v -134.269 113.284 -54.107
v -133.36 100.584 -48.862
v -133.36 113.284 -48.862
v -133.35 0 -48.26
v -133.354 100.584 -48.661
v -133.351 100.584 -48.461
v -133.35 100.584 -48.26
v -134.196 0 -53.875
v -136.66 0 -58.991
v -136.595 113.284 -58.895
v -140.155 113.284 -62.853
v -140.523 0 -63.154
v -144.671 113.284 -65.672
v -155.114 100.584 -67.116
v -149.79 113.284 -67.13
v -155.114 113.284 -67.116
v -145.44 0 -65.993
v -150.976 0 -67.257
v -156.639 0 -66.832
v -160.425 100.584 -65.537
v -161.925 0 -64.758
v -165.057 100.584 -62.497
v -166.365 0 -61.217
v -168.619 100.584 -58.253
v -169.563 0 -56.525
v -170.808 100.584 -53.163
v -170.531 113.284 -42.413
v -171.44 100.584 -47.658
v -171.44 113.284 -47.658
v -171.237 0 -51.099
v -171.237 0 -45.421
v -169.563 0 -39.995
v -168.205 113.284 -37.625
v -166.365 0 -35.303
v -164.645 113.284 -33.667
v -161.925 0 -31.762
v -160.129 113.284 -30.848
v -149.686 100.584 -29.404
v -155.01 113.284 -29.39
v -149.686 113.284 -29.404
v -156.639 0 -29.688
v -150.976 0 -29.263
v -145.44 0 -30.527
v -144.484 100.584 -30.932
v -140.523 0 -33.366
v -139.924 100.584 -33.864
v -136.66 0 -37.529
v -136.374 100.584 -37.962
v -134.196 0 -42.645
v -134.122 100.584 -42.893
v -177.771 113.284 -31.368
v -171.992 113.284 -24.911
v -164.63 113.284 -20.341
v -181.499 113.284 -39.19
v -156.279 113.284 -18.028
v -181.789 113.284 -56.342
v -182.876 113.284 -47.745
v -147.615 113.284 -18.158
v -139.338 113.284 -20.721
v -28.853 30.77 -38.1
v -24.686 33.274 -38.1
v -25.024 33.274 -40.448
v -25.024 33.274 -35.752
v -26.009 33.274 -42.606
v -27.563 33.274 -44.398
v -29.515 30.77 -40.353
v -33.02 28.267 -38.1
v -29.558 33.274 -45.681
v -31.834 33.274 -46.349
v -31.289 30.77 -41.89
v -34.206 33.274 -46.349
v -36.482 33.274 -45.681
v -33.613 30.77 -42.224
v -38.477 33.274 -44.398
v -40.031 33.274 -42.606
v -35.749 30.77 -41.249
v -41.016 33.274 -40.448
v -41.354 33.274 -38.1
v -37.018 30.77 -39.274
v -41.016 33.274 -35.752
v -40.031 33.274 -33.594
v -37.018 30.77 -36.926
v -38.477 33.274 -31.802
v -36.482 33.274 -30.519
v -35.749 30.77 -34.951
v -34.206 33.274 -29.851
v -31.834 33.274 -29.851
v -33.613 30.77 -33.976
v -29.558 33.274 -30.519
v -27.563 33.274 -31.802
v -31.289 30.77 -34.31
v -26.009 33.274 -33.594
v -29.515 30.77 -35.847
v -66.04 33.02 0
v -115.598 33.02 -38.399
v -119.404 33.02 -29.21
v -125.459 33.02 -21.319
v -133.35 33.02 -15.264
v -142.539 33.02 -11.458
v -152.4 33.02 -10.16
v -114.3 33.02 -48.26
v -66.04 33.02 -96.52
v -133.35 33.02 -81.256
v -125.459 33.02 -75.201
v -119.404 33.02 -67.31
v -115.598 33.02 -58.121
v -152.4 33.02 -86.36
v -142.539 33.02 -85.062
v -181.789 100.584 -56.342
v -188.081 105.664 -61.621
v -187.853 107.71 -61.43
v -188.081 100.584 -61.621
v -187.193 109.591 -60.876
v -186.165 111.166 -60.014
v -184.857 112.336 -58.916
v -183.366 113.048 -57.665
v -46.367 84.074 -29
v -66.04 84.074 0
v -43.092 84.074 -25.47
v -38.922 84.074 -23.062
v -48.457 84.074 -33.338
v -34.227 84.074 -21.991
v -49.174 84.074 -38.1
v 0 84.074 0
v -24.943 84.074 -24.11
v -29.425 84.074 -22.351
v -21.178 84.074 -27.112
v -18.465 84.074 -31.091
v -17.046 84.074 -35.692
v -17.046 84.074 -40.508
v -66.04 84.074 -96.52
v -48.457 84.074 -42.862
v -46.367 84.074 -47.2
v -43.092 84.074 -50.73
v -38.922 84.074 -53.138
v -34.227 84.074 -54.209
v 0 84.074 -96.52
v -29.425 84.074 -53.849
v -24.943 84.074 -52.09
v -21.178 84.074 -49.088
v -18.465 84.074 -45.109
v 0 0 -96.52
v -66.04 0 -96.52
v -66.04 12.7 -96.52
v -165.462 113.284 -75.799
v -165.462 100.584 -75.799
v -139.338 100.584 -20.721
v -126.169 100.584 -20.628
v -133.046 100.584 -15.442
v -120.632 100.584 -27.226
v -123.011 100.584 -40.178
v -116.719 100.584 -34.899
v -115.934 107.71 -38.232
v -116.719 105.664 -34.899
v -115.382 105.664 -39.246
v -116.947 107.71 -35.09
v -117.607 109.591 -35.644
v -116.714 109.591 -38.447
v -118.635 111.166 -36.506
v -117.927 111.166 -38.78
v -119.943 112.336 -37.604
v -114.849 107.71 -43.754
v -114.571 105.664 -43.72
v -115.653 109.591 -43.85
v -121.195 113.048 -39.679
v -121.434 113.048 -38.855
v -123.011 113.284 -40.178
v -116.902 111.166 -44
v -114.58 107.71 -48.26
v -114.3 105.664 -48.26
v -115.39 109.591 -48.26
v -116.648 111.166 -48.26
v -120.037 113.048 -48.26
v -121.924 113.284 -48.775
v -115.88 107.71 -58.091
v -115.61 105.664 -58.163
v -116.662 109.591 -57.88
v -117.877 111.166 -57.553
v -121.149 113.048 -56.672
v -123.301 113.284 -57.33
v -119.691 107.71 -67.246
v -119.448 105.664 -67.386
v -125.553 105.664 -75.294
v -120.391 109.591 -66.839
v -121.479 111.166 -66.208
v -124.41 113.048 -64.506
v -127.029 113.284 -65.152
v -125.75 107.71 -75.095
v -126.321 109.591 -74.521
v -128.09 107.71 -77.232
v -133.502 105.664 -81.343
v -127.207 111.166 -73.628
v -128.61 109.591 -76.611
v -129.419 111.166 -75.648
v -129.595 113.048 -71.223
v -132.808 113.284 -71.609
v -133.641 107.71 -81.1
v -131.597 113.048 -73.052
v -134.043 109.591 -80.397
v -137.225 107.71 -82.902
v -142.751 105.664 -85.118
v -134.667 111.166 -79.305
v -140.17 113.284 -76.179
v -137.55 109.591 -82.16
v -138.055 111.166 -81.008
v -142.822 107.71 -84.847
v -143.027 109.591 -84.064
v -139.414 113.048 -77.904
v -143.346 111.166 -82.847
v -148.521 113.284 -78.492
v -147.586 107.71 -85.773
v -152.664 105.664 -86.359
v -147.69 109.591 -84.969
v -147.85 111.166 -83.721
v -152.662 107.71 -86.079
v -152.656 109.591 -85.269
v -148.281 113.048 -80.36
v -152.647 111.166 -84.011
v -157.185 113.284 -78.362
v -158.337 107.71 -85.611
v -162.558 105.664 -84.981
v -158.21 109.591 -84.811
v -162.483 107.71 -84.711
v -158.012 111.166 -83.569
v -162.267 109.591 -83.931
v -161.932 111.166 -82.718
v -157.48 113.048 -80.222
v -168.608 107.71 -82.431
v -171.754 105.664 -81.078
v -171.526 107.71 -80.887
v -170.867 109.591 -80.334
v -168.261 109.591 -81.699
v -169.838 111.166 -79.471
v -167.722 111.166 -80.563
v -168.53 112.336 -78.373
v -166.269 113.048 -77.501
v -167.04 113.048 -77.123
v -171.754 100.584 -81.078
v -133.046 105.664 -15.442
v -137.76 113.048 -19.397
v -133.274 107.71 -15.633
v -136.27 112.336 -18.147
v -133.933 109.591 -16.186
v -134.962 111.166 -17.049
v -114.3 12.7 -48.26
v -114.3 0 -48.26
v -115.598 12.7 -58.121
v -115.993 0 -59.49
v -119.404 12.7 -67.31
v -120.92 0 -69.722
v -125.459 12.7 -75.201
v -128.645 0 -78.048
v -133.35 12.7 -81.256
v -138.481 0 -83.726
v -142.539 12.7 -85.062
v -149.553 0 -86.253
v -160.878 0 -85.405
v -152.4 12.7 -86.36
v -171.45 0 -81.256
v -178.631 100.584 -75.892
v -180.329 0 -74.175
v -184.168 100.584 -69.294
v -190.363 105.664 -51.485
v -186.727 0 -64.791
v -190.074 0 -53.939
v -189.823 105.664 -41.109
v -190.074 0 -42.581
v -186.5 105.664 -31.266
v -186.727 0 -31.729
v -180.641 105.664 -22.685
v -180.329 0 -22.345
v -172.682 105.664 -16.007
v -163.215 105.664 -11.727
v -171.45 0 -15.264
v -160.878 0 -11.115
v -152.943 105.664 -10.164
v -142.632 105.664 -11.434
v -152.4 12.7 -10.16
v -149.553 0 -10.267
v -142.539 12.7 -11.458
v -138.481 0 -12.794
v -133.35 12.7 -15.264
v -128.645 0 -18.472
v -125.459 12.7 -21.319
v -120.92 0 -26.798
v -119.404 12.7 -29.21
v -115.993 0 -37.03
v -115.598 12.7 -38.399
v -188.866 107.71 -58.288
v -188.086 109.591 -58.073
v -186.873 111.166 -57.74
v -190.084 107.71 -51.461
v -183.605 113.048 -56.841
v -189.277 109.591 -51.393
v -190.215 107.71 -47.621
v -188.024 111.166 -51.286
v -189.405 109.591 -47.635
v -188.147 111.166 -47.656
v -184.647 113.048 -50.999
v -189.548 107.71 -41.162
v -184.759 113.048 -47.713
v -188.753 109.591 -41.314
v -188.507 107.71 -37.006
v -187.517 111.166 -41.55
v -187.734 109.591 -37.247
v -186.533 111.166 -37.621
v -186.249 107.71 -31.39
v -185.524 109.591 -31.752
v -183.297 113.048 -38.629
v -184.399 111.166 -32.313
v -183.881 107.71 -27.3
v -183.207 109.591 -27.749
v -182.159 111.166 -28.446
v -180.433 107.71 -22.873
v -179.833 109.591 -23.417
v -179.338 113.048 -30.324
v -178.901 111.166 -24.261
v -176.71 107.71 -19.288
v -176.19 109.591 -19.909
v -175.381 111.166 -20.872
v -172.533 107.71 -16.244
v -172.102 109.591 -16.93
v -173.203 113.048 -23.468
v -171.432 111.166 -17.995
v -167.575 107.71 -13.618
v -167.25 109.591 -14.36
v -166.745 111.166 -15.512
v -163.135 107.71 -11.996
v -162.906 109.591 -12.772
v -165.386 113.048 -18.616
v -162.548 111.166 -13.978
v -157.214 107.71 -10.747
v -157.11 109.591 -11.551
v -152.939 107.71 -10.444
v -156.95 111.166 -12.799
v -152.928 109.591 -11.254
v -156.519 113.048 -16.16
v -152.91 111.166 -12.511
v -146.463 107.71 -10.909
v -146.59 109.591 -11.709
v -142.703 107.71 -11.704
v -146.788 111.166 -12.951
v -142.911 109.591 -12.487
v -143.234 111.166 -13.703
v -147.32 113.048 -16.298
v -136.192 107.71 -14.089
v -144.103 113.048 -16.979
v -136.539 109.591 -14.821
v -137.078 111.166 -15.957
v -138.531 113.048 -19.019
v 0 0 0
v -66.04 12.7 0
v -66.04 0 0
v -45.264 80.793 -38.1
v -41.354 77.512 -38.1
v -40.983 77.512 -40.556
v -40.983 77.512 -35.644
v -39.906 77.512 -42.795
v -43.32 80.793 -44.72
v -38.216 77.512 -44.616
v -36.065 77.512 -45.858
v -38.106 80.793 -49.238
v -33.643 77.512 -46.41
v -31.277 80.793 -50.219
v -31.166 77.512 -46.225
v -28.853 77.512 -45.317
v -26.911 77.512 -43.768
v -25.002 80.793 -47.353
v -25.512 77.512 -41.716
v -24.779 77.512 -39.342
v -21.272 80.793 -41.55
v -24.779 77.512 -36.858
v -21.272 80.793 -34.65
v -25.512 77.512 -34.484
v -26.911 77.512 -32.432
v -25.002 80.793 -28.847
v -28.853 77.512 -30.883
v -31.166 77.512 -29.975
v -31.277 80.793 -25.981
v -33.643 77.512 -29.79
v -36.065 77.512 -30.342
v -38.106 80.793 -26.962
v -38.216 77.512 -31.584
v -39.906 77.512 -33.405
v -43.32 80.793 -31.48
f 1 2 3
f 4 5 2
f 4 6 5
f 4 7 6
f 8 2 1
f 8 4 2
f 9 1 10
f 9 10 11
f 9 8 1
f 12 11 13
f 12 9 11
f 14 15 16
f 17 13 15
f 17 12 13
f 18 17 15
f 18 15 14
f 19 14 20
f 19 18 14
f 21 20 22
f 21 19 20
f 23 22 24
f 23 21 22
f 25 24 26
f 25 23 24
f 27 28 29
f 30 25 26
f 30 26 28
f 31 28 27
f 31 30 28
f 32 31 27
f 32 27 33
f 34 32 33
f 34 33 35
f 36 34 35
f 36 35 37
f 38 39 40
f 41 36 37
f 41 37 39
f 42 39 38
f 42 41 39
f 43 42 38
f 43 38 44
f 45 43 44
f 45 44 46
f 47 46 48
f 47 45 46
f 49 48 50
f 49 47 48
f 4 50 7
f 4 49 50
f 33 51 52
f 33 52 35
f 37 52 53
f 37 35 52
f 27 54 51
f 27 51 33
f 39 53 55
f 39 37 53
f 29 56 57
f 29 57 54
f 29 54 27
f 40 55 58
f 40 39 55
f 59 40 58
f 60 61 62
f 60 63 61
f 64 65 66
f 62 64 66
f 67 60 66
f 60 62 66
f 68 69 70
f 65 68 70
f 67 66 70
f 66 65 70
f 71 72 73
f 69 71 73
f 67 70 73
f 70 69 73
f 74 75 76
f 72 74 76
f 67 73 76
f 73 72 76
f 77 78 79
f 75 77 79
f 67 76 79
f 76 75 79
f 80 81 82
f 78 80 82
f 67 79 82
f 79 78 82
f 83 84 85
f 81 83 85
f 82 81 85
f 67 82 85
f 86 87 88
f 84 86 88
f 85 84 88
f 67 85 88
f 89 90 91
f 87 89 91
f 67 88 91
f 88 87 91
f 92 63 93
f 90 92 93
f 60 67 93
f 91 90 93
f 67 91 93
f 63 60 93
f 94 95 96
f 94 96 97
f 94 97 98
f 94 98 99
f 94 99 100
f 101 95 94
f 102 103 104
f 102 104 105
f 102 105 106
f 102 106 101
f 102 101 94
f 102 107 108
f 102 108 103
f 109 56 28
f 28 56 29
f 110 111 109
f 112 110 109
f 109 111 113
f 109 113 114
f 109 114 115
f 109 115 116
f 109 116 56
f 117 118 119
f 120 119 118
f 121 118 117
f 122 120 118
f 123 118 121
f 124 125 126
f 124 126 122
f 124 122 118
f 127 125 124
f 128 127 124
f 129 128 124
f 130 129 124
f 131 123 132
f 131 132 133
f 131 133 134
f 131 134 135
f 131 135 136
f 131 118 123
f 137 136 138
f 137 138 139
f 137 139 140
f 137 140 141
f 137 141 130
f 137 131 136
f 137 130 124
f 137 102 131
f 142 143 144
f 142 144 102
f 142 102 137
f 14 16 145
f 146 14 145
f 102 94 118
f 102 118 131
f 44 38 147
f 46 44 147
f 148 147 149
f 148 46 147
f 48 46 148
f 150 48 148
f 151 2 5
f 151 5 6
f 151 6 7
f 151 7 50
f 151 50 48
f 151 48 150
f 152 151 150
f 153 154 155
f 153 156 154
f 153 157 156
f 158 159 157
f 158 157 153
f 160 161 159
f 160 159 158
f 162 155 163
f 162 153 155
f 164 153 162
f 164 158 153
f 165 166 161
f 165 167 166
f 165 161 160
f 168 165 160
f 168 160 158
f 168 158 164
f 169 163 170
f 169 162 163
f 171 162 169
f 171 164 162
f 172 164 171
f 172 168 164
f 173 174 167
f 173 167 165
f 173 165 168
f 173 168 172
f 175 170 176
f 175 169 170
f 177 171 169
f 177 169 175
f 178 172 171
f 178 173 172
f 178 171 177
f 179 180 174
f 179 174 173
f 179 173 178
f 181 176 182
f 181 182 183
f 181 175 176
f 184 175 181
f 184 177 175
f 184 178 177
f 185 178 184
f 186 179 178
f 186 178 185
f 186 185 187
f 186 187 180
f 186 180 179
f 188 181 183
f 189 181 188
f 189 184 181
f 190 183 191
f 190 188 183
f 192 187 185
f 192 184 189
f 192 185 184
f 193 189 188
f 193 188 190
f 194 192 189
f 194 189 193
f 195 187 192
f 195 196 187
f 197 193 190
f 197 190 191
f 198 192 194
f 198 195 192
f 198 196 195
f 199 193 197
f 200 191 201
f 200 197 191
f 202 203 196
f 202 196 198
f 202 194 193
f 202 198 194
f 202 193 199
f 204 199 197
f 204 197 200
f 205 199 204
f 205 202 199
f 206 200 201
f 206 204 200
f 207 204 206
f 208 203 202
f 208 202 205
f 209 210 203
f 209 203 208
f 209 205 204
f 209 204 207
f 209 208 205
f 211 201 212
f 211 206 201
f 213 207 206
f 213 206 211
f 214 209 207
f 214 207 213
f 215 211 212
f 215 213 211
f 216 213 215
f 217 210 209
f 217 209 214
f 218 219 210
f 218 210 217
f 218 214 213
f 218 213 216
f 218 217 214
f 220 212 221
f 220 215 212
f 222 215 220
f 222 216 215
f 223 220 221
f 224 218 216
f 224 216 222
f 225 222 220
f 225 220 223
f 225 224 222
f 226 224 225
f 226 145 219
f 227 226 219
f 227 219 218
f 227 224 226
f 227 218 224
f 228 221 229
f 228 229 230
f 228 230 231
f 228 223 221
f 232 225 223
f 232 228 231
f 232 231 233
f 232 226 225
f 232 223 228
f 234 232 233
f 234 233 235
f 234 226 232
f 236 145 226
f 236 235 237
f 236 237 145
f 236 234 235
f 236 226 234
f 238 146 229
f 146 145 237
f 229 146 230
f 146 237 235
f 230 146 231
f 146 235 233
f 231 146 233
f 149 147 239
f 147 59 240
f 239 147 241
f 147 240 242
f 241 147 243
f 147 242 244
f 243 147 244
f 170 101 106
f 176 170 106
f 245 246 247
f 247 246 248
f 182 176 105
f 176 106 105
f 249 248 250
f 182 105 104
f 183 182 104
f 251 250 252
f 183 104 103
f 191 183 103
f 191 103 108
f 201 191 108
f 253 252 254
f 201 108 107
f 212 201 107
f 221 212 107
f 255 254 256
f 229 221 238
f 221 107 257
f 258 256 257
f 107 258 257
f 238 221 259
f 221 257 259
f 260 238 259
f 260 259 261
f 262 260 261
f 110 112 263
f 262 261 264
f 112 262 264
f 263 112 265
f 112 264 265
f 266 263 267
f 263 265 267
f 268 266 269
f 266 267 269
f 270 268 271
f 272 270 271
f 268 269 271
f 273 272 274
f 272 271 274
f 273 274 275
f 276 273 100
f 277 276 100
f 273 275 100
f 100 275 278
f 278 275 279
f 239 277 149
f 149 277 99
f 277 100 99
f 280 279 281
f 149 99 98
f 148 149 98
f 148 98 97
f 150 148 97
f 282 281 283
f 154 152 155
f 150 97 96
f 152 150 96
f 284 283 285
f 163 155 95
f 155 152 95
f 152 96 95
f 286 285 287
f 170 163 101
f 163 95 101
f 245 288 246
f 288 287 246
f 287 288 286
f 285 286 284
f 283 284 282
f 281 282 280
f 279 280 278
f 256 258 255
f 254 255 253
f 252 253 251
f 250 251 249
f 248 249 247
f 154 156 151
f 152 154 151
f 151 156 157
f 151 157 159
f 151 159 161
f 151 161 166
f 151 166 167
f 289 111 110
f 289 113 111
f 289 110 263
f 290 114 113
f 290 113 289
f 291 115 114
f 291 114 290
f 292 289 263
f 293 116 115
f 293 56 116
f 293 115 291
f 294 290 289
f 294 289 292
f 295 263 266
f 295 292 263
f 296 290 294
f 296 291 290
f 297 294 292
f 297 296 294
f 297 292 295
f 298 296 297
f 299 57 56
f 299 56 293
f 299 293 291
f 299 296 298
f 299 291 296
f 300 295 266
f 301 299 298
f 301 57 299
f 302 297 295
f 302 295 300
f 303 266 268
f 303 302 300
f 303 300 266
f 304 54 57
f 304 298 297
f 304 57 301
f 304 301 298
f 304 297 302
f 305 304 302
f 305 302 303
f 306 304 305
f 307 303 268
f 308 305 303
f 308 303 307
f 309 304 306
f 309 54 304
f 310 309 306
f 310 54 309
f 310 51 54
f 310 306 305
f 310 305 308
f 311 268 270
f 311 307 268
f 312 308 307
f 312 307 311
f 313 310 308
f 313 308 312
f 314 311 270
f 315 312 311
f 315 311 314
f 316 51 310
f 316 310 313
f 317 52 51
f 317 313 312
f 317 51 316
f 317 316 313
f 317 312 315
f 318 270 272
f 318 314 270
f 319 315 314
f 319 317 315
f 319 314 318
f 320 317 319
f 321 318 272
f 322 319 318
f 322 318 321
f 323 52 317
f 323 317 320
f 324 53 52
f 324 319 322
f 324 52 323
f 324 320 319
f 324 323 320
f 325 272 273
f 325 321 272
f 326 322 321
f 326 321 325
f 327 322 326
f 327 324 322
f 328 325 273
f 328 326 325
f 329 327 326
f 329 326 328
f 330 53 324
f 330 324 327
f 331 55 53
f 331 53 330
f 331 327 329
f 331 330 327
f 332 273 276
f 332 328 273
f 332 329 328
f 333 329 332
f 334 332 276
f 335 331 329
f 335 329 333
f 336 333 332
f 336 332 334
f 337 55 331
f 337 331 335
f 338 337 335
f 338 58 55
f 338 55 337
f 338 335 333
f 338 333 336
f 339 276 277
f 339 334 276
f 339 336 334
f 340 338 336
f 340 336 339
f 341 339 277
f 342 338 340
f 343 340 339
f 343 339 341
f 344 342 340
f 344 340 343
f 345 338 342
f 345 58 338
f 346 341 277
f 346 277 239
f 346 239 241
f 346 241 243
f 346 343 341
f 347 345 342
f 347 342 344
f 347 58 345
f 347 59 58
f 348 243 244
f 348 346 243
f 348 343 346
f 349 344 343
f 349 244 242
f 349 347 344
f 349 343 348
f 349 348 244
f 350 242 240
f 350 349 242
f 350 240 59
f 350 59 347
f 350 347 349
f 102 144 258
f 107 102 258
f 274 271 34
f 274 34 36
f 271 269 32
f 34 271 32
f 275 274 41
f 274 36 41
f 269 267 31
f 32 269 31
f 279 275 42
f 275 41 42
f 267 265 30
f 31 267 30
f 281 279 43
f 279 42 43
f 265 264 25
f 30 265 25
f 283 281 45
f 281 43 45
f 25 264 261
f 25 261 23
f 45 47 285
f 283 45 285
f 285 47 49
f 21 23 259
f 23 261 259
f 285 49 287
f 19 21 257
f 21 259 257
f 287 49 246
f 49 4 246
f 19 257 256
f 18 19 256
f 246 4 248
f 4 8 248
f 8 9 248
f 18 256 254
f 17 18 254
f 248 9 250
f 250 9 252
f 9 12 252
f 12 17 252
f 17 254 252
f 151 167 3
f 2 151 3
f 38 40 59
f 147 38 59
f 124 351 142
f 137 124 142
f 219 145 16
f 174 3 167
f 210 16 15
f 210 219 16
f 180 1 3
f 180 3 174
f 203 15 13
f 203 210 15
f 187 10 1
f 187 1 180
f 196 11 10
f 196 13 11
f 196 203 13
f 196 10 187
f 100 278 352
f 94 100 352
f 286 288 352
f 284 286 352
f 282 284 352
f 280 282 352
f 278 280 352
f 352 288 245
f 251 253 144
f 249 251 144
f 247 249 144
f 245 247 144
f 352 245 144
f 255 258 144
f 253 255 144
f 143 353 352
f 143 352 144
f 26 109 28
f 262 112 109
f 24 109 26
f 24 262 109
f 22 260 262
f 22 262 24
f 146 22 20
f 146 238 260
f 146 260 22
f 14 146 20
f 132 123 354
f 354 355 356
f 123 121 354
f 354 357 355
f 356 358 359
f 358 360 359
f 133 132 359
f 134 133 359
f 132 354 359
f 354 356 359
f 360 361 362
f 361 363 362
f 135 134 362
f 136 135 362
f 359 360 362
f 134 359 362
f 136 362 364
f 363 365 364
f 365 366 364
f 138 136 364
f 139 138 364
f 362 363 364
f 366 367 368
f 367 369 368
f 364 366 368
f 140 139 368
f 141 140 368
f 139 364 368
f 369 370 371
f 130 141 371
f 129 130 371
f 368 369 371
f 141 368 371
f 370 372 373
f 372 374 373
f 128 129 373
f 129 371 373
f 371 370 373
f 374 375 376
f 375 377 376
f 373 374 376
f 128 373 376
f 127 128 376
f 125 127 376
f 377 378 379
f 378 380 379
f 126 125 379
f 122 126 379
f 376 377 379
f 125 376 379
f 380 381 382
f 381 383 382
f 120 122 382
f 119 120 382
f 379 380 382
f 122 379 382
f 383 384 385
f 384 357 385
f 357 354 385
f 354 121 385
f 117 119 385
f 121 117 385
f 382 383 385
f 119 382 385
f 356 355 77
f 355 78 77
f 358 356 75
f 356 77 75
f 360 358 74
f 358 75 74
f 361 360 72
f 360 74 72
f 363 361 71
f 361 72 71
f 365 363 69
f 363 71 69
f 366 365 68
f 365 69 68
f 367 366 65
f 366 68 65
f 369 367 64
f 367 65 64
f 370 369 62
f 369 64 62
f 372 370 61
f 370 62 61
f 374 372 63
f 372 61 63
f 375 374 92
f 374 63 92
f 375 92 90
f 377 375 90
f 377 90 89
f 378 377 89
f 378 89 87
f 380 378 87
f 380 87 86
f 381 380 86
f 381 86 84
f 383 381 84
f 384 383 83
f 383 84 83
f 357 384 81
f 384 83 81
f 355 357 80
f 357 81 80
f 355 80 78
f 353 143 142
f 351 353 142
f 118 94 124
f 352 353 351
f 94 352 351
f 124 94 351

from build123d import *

# Parameters (mm, degrees)
SKETCH1_W                                           = 66.04
SKETCH1_H                                           = 96.52
BOSS_EXTRUDE1_DEPTH                                 = 84.074
BOSS_EXTRUDE2_START                                 = 12.7
BOSS_EXTRUDE2_DEPTH                                 = 20.32
SKETCH1_4_R                                         = 19.05
BOSS_EXTRUDE3_DEPTH                                 = 113.284
FILLET1_R                                           = 7.62
CSK_FOR_5_8_FLAT_HEAD_MACHINE_SCREW_100_D           = 16.66748
CSK_FOR_5_8_FLAT_HEAD_MACHINE_SCREW_100_DEPTH       = 50.8
CSK_FOR_5_8_FLAT_HEAD_MACHINE_SCREW_100_CSINK_D     = 32.3088
CSK_FOR_5_8_FLAT_HEAD_MACHINE_SCREW_100_CSINK_ANGLE = 100
CSK_FOR_5_8_FLAT_HEAD_MACHINE_SCREW_100_TIP         = 5.007416175
CUT_EXTRUDE1_START                                  = -12.7
CUT_EXTRUDE1_DEPTH                                  = 12.7


with BuildPart() as part:
    # Sketch1 → Boss-Extrude1 (new body)
    with BuildSketch(Plane(origin=(0, 0, 0), x_dir=(1, 0, 0), z_dir=(0, 1, 0))):
        with Locations((-33.02, 48.26)):
            Rectangle(SKETCH1_W, SKETCH1_H)
    extrude(amount=BOSS_EXTRUDE1_DEPTH)

    # Sketch1<3> → Boss-Extrude2 (add)
    with BuildSketch(Plane(origin=(0, 0, 0), x_dir=(1, 0, 0), z_dir=(0, 1, 0)).offset(BOSS_EXTRUDE2_START)):
        with BuildLine():
            Line((-152.4, 10.16), (-66.04, 0))
            Line((-66.04, 0), (-66.04, 96.52))
            Line((-66.04, 96.52), (-152.4, 86.36))
            ThreePointArc((-152.4, 86.36), (-125.459231637, 75.200768363), (-114.3, 48.26))
            ThreePointArc((-114.3, 48.26), (-125.459231637, 21.319231637), (-152.4, 10.16))
        make_face()
    extrude(amount=BOSS_EXTRUDE2_DEPTH)

    # Sketch1<4> → Boss-Extrude3 (add)
    with BuildSketch(Plane(origin=(0, 0, 0), x_dir=(1, 0, 0), z_dir=(0, 1, 0))):
        with BuildLine():
            ThreePointArc((-152.4, 86.36), (-190.5, 48.26), (-152.4, 10.16))
            ThreePointArc((-152.4, 10.16), (-125.459231637, 21.319231637), (-114.3, 48.26))
            ThreePointArc((-114.3, 48.26), (-125.459231637, 75.200768363), (-152.4, 86.36))
        make_face()
        with Locations((-152.4, 48.26)):
            Circle(SKETCH1_4_R, mode=Mode.SUBTRACT)
    extrude(amount=BOSS_EXTRUDE3_DEPTH)

    # Fillet1
    fillet1_edges = [part.edges().sort_by_distance(p)[0] for p in [
        (-190.5, 113.284, -48.26),
    ]]
    fillet(fillet1_edges, radius=FILLET1_R)

    # CSK for 5/8 Flat Head Machine Screw (100)1
    with Locations(Plane(origin=(0, 84.074, 0), x_dir=(1, 0, 0), z_dir=(0, 1, 0))):
        with Locations((-33.02, 38.1)):
            CounterSinkHole(CSK_FOR_5_8_FLAT_HEAD_MACHINE_SCREW_100_D / 2, CSK_FOR_5_8_FLAT_HEAD_MACHINE_SCREW_100_CSINK_D / 2, depth=CSK_FOR_5_8_FLAT_HEAD_MACHINE_SCREW_100_DEPTH, counter_sink_angle=CSK_FOR_5_8_FLAT_HEAD_MACHINE_SCREW_100_CSINK_ANGLE)
            with Locations((0, 0, -(CSK_FOR_5_8_FLAT_HEAD_MACHINE_SCREW_100_DEPTH + CSK_FOR_5_8_FLAT_HEAD_MACHINE_SCREW_100_TIP / 2))):  # 118° drill point
                Cone(0, CSK_FOR_5_8_FLAT_HEAD_MACHINE_SCREW_100_D / 2, CSK_FOR_5_8_FLAT_HEAD_MACHINE_SCREW_100_TIP, mode=Mode.SUBTRACT)

    # Sketch4 → Cut-Extrude1 (cut)
    with BuildSketch(Plane(origin=(0, 113.284, 0), x_dir=(1, 0, 0), z_dir=(0, 1, 0)).offset(CUT_EXTRUDE1_START)):
        with BuildLine():
            Line((-181.640283335, 89.374183536), (-197.967088621, 69.916654681))
            Line((-197.967088621, 69.916654681), (-171.440491942, 47.658197191))
            ThreePointArc((-171.440491942, 47.658197191), (-166.993146641, 60.505103965), (-155.113686656, 67.115726046))
            Line((-155.113686656, 67.115726046), (-181.640283335, 89.374183536))
        make_face()
        with BuildLine():
            Line((-87.056717789, 10.009148571), (-133.359508058, 48.861802809))
            ThreePointArc((-133.359508058, 48.861802809), (-137.806853359, 36.014896035), (-149.686313344, 29.404273954))
            Line((-149.686313344, 29.404273954), (-103.383523075, -9.448380284))
            Line((-103.383523075, -9.448380284), (-87.056717789, 10.009148571))
        make_face()
    extrude(amount=CUT_EXTRUDE1_DEPTH, mode=Mode.SUBTRACT)


solid = part.part
